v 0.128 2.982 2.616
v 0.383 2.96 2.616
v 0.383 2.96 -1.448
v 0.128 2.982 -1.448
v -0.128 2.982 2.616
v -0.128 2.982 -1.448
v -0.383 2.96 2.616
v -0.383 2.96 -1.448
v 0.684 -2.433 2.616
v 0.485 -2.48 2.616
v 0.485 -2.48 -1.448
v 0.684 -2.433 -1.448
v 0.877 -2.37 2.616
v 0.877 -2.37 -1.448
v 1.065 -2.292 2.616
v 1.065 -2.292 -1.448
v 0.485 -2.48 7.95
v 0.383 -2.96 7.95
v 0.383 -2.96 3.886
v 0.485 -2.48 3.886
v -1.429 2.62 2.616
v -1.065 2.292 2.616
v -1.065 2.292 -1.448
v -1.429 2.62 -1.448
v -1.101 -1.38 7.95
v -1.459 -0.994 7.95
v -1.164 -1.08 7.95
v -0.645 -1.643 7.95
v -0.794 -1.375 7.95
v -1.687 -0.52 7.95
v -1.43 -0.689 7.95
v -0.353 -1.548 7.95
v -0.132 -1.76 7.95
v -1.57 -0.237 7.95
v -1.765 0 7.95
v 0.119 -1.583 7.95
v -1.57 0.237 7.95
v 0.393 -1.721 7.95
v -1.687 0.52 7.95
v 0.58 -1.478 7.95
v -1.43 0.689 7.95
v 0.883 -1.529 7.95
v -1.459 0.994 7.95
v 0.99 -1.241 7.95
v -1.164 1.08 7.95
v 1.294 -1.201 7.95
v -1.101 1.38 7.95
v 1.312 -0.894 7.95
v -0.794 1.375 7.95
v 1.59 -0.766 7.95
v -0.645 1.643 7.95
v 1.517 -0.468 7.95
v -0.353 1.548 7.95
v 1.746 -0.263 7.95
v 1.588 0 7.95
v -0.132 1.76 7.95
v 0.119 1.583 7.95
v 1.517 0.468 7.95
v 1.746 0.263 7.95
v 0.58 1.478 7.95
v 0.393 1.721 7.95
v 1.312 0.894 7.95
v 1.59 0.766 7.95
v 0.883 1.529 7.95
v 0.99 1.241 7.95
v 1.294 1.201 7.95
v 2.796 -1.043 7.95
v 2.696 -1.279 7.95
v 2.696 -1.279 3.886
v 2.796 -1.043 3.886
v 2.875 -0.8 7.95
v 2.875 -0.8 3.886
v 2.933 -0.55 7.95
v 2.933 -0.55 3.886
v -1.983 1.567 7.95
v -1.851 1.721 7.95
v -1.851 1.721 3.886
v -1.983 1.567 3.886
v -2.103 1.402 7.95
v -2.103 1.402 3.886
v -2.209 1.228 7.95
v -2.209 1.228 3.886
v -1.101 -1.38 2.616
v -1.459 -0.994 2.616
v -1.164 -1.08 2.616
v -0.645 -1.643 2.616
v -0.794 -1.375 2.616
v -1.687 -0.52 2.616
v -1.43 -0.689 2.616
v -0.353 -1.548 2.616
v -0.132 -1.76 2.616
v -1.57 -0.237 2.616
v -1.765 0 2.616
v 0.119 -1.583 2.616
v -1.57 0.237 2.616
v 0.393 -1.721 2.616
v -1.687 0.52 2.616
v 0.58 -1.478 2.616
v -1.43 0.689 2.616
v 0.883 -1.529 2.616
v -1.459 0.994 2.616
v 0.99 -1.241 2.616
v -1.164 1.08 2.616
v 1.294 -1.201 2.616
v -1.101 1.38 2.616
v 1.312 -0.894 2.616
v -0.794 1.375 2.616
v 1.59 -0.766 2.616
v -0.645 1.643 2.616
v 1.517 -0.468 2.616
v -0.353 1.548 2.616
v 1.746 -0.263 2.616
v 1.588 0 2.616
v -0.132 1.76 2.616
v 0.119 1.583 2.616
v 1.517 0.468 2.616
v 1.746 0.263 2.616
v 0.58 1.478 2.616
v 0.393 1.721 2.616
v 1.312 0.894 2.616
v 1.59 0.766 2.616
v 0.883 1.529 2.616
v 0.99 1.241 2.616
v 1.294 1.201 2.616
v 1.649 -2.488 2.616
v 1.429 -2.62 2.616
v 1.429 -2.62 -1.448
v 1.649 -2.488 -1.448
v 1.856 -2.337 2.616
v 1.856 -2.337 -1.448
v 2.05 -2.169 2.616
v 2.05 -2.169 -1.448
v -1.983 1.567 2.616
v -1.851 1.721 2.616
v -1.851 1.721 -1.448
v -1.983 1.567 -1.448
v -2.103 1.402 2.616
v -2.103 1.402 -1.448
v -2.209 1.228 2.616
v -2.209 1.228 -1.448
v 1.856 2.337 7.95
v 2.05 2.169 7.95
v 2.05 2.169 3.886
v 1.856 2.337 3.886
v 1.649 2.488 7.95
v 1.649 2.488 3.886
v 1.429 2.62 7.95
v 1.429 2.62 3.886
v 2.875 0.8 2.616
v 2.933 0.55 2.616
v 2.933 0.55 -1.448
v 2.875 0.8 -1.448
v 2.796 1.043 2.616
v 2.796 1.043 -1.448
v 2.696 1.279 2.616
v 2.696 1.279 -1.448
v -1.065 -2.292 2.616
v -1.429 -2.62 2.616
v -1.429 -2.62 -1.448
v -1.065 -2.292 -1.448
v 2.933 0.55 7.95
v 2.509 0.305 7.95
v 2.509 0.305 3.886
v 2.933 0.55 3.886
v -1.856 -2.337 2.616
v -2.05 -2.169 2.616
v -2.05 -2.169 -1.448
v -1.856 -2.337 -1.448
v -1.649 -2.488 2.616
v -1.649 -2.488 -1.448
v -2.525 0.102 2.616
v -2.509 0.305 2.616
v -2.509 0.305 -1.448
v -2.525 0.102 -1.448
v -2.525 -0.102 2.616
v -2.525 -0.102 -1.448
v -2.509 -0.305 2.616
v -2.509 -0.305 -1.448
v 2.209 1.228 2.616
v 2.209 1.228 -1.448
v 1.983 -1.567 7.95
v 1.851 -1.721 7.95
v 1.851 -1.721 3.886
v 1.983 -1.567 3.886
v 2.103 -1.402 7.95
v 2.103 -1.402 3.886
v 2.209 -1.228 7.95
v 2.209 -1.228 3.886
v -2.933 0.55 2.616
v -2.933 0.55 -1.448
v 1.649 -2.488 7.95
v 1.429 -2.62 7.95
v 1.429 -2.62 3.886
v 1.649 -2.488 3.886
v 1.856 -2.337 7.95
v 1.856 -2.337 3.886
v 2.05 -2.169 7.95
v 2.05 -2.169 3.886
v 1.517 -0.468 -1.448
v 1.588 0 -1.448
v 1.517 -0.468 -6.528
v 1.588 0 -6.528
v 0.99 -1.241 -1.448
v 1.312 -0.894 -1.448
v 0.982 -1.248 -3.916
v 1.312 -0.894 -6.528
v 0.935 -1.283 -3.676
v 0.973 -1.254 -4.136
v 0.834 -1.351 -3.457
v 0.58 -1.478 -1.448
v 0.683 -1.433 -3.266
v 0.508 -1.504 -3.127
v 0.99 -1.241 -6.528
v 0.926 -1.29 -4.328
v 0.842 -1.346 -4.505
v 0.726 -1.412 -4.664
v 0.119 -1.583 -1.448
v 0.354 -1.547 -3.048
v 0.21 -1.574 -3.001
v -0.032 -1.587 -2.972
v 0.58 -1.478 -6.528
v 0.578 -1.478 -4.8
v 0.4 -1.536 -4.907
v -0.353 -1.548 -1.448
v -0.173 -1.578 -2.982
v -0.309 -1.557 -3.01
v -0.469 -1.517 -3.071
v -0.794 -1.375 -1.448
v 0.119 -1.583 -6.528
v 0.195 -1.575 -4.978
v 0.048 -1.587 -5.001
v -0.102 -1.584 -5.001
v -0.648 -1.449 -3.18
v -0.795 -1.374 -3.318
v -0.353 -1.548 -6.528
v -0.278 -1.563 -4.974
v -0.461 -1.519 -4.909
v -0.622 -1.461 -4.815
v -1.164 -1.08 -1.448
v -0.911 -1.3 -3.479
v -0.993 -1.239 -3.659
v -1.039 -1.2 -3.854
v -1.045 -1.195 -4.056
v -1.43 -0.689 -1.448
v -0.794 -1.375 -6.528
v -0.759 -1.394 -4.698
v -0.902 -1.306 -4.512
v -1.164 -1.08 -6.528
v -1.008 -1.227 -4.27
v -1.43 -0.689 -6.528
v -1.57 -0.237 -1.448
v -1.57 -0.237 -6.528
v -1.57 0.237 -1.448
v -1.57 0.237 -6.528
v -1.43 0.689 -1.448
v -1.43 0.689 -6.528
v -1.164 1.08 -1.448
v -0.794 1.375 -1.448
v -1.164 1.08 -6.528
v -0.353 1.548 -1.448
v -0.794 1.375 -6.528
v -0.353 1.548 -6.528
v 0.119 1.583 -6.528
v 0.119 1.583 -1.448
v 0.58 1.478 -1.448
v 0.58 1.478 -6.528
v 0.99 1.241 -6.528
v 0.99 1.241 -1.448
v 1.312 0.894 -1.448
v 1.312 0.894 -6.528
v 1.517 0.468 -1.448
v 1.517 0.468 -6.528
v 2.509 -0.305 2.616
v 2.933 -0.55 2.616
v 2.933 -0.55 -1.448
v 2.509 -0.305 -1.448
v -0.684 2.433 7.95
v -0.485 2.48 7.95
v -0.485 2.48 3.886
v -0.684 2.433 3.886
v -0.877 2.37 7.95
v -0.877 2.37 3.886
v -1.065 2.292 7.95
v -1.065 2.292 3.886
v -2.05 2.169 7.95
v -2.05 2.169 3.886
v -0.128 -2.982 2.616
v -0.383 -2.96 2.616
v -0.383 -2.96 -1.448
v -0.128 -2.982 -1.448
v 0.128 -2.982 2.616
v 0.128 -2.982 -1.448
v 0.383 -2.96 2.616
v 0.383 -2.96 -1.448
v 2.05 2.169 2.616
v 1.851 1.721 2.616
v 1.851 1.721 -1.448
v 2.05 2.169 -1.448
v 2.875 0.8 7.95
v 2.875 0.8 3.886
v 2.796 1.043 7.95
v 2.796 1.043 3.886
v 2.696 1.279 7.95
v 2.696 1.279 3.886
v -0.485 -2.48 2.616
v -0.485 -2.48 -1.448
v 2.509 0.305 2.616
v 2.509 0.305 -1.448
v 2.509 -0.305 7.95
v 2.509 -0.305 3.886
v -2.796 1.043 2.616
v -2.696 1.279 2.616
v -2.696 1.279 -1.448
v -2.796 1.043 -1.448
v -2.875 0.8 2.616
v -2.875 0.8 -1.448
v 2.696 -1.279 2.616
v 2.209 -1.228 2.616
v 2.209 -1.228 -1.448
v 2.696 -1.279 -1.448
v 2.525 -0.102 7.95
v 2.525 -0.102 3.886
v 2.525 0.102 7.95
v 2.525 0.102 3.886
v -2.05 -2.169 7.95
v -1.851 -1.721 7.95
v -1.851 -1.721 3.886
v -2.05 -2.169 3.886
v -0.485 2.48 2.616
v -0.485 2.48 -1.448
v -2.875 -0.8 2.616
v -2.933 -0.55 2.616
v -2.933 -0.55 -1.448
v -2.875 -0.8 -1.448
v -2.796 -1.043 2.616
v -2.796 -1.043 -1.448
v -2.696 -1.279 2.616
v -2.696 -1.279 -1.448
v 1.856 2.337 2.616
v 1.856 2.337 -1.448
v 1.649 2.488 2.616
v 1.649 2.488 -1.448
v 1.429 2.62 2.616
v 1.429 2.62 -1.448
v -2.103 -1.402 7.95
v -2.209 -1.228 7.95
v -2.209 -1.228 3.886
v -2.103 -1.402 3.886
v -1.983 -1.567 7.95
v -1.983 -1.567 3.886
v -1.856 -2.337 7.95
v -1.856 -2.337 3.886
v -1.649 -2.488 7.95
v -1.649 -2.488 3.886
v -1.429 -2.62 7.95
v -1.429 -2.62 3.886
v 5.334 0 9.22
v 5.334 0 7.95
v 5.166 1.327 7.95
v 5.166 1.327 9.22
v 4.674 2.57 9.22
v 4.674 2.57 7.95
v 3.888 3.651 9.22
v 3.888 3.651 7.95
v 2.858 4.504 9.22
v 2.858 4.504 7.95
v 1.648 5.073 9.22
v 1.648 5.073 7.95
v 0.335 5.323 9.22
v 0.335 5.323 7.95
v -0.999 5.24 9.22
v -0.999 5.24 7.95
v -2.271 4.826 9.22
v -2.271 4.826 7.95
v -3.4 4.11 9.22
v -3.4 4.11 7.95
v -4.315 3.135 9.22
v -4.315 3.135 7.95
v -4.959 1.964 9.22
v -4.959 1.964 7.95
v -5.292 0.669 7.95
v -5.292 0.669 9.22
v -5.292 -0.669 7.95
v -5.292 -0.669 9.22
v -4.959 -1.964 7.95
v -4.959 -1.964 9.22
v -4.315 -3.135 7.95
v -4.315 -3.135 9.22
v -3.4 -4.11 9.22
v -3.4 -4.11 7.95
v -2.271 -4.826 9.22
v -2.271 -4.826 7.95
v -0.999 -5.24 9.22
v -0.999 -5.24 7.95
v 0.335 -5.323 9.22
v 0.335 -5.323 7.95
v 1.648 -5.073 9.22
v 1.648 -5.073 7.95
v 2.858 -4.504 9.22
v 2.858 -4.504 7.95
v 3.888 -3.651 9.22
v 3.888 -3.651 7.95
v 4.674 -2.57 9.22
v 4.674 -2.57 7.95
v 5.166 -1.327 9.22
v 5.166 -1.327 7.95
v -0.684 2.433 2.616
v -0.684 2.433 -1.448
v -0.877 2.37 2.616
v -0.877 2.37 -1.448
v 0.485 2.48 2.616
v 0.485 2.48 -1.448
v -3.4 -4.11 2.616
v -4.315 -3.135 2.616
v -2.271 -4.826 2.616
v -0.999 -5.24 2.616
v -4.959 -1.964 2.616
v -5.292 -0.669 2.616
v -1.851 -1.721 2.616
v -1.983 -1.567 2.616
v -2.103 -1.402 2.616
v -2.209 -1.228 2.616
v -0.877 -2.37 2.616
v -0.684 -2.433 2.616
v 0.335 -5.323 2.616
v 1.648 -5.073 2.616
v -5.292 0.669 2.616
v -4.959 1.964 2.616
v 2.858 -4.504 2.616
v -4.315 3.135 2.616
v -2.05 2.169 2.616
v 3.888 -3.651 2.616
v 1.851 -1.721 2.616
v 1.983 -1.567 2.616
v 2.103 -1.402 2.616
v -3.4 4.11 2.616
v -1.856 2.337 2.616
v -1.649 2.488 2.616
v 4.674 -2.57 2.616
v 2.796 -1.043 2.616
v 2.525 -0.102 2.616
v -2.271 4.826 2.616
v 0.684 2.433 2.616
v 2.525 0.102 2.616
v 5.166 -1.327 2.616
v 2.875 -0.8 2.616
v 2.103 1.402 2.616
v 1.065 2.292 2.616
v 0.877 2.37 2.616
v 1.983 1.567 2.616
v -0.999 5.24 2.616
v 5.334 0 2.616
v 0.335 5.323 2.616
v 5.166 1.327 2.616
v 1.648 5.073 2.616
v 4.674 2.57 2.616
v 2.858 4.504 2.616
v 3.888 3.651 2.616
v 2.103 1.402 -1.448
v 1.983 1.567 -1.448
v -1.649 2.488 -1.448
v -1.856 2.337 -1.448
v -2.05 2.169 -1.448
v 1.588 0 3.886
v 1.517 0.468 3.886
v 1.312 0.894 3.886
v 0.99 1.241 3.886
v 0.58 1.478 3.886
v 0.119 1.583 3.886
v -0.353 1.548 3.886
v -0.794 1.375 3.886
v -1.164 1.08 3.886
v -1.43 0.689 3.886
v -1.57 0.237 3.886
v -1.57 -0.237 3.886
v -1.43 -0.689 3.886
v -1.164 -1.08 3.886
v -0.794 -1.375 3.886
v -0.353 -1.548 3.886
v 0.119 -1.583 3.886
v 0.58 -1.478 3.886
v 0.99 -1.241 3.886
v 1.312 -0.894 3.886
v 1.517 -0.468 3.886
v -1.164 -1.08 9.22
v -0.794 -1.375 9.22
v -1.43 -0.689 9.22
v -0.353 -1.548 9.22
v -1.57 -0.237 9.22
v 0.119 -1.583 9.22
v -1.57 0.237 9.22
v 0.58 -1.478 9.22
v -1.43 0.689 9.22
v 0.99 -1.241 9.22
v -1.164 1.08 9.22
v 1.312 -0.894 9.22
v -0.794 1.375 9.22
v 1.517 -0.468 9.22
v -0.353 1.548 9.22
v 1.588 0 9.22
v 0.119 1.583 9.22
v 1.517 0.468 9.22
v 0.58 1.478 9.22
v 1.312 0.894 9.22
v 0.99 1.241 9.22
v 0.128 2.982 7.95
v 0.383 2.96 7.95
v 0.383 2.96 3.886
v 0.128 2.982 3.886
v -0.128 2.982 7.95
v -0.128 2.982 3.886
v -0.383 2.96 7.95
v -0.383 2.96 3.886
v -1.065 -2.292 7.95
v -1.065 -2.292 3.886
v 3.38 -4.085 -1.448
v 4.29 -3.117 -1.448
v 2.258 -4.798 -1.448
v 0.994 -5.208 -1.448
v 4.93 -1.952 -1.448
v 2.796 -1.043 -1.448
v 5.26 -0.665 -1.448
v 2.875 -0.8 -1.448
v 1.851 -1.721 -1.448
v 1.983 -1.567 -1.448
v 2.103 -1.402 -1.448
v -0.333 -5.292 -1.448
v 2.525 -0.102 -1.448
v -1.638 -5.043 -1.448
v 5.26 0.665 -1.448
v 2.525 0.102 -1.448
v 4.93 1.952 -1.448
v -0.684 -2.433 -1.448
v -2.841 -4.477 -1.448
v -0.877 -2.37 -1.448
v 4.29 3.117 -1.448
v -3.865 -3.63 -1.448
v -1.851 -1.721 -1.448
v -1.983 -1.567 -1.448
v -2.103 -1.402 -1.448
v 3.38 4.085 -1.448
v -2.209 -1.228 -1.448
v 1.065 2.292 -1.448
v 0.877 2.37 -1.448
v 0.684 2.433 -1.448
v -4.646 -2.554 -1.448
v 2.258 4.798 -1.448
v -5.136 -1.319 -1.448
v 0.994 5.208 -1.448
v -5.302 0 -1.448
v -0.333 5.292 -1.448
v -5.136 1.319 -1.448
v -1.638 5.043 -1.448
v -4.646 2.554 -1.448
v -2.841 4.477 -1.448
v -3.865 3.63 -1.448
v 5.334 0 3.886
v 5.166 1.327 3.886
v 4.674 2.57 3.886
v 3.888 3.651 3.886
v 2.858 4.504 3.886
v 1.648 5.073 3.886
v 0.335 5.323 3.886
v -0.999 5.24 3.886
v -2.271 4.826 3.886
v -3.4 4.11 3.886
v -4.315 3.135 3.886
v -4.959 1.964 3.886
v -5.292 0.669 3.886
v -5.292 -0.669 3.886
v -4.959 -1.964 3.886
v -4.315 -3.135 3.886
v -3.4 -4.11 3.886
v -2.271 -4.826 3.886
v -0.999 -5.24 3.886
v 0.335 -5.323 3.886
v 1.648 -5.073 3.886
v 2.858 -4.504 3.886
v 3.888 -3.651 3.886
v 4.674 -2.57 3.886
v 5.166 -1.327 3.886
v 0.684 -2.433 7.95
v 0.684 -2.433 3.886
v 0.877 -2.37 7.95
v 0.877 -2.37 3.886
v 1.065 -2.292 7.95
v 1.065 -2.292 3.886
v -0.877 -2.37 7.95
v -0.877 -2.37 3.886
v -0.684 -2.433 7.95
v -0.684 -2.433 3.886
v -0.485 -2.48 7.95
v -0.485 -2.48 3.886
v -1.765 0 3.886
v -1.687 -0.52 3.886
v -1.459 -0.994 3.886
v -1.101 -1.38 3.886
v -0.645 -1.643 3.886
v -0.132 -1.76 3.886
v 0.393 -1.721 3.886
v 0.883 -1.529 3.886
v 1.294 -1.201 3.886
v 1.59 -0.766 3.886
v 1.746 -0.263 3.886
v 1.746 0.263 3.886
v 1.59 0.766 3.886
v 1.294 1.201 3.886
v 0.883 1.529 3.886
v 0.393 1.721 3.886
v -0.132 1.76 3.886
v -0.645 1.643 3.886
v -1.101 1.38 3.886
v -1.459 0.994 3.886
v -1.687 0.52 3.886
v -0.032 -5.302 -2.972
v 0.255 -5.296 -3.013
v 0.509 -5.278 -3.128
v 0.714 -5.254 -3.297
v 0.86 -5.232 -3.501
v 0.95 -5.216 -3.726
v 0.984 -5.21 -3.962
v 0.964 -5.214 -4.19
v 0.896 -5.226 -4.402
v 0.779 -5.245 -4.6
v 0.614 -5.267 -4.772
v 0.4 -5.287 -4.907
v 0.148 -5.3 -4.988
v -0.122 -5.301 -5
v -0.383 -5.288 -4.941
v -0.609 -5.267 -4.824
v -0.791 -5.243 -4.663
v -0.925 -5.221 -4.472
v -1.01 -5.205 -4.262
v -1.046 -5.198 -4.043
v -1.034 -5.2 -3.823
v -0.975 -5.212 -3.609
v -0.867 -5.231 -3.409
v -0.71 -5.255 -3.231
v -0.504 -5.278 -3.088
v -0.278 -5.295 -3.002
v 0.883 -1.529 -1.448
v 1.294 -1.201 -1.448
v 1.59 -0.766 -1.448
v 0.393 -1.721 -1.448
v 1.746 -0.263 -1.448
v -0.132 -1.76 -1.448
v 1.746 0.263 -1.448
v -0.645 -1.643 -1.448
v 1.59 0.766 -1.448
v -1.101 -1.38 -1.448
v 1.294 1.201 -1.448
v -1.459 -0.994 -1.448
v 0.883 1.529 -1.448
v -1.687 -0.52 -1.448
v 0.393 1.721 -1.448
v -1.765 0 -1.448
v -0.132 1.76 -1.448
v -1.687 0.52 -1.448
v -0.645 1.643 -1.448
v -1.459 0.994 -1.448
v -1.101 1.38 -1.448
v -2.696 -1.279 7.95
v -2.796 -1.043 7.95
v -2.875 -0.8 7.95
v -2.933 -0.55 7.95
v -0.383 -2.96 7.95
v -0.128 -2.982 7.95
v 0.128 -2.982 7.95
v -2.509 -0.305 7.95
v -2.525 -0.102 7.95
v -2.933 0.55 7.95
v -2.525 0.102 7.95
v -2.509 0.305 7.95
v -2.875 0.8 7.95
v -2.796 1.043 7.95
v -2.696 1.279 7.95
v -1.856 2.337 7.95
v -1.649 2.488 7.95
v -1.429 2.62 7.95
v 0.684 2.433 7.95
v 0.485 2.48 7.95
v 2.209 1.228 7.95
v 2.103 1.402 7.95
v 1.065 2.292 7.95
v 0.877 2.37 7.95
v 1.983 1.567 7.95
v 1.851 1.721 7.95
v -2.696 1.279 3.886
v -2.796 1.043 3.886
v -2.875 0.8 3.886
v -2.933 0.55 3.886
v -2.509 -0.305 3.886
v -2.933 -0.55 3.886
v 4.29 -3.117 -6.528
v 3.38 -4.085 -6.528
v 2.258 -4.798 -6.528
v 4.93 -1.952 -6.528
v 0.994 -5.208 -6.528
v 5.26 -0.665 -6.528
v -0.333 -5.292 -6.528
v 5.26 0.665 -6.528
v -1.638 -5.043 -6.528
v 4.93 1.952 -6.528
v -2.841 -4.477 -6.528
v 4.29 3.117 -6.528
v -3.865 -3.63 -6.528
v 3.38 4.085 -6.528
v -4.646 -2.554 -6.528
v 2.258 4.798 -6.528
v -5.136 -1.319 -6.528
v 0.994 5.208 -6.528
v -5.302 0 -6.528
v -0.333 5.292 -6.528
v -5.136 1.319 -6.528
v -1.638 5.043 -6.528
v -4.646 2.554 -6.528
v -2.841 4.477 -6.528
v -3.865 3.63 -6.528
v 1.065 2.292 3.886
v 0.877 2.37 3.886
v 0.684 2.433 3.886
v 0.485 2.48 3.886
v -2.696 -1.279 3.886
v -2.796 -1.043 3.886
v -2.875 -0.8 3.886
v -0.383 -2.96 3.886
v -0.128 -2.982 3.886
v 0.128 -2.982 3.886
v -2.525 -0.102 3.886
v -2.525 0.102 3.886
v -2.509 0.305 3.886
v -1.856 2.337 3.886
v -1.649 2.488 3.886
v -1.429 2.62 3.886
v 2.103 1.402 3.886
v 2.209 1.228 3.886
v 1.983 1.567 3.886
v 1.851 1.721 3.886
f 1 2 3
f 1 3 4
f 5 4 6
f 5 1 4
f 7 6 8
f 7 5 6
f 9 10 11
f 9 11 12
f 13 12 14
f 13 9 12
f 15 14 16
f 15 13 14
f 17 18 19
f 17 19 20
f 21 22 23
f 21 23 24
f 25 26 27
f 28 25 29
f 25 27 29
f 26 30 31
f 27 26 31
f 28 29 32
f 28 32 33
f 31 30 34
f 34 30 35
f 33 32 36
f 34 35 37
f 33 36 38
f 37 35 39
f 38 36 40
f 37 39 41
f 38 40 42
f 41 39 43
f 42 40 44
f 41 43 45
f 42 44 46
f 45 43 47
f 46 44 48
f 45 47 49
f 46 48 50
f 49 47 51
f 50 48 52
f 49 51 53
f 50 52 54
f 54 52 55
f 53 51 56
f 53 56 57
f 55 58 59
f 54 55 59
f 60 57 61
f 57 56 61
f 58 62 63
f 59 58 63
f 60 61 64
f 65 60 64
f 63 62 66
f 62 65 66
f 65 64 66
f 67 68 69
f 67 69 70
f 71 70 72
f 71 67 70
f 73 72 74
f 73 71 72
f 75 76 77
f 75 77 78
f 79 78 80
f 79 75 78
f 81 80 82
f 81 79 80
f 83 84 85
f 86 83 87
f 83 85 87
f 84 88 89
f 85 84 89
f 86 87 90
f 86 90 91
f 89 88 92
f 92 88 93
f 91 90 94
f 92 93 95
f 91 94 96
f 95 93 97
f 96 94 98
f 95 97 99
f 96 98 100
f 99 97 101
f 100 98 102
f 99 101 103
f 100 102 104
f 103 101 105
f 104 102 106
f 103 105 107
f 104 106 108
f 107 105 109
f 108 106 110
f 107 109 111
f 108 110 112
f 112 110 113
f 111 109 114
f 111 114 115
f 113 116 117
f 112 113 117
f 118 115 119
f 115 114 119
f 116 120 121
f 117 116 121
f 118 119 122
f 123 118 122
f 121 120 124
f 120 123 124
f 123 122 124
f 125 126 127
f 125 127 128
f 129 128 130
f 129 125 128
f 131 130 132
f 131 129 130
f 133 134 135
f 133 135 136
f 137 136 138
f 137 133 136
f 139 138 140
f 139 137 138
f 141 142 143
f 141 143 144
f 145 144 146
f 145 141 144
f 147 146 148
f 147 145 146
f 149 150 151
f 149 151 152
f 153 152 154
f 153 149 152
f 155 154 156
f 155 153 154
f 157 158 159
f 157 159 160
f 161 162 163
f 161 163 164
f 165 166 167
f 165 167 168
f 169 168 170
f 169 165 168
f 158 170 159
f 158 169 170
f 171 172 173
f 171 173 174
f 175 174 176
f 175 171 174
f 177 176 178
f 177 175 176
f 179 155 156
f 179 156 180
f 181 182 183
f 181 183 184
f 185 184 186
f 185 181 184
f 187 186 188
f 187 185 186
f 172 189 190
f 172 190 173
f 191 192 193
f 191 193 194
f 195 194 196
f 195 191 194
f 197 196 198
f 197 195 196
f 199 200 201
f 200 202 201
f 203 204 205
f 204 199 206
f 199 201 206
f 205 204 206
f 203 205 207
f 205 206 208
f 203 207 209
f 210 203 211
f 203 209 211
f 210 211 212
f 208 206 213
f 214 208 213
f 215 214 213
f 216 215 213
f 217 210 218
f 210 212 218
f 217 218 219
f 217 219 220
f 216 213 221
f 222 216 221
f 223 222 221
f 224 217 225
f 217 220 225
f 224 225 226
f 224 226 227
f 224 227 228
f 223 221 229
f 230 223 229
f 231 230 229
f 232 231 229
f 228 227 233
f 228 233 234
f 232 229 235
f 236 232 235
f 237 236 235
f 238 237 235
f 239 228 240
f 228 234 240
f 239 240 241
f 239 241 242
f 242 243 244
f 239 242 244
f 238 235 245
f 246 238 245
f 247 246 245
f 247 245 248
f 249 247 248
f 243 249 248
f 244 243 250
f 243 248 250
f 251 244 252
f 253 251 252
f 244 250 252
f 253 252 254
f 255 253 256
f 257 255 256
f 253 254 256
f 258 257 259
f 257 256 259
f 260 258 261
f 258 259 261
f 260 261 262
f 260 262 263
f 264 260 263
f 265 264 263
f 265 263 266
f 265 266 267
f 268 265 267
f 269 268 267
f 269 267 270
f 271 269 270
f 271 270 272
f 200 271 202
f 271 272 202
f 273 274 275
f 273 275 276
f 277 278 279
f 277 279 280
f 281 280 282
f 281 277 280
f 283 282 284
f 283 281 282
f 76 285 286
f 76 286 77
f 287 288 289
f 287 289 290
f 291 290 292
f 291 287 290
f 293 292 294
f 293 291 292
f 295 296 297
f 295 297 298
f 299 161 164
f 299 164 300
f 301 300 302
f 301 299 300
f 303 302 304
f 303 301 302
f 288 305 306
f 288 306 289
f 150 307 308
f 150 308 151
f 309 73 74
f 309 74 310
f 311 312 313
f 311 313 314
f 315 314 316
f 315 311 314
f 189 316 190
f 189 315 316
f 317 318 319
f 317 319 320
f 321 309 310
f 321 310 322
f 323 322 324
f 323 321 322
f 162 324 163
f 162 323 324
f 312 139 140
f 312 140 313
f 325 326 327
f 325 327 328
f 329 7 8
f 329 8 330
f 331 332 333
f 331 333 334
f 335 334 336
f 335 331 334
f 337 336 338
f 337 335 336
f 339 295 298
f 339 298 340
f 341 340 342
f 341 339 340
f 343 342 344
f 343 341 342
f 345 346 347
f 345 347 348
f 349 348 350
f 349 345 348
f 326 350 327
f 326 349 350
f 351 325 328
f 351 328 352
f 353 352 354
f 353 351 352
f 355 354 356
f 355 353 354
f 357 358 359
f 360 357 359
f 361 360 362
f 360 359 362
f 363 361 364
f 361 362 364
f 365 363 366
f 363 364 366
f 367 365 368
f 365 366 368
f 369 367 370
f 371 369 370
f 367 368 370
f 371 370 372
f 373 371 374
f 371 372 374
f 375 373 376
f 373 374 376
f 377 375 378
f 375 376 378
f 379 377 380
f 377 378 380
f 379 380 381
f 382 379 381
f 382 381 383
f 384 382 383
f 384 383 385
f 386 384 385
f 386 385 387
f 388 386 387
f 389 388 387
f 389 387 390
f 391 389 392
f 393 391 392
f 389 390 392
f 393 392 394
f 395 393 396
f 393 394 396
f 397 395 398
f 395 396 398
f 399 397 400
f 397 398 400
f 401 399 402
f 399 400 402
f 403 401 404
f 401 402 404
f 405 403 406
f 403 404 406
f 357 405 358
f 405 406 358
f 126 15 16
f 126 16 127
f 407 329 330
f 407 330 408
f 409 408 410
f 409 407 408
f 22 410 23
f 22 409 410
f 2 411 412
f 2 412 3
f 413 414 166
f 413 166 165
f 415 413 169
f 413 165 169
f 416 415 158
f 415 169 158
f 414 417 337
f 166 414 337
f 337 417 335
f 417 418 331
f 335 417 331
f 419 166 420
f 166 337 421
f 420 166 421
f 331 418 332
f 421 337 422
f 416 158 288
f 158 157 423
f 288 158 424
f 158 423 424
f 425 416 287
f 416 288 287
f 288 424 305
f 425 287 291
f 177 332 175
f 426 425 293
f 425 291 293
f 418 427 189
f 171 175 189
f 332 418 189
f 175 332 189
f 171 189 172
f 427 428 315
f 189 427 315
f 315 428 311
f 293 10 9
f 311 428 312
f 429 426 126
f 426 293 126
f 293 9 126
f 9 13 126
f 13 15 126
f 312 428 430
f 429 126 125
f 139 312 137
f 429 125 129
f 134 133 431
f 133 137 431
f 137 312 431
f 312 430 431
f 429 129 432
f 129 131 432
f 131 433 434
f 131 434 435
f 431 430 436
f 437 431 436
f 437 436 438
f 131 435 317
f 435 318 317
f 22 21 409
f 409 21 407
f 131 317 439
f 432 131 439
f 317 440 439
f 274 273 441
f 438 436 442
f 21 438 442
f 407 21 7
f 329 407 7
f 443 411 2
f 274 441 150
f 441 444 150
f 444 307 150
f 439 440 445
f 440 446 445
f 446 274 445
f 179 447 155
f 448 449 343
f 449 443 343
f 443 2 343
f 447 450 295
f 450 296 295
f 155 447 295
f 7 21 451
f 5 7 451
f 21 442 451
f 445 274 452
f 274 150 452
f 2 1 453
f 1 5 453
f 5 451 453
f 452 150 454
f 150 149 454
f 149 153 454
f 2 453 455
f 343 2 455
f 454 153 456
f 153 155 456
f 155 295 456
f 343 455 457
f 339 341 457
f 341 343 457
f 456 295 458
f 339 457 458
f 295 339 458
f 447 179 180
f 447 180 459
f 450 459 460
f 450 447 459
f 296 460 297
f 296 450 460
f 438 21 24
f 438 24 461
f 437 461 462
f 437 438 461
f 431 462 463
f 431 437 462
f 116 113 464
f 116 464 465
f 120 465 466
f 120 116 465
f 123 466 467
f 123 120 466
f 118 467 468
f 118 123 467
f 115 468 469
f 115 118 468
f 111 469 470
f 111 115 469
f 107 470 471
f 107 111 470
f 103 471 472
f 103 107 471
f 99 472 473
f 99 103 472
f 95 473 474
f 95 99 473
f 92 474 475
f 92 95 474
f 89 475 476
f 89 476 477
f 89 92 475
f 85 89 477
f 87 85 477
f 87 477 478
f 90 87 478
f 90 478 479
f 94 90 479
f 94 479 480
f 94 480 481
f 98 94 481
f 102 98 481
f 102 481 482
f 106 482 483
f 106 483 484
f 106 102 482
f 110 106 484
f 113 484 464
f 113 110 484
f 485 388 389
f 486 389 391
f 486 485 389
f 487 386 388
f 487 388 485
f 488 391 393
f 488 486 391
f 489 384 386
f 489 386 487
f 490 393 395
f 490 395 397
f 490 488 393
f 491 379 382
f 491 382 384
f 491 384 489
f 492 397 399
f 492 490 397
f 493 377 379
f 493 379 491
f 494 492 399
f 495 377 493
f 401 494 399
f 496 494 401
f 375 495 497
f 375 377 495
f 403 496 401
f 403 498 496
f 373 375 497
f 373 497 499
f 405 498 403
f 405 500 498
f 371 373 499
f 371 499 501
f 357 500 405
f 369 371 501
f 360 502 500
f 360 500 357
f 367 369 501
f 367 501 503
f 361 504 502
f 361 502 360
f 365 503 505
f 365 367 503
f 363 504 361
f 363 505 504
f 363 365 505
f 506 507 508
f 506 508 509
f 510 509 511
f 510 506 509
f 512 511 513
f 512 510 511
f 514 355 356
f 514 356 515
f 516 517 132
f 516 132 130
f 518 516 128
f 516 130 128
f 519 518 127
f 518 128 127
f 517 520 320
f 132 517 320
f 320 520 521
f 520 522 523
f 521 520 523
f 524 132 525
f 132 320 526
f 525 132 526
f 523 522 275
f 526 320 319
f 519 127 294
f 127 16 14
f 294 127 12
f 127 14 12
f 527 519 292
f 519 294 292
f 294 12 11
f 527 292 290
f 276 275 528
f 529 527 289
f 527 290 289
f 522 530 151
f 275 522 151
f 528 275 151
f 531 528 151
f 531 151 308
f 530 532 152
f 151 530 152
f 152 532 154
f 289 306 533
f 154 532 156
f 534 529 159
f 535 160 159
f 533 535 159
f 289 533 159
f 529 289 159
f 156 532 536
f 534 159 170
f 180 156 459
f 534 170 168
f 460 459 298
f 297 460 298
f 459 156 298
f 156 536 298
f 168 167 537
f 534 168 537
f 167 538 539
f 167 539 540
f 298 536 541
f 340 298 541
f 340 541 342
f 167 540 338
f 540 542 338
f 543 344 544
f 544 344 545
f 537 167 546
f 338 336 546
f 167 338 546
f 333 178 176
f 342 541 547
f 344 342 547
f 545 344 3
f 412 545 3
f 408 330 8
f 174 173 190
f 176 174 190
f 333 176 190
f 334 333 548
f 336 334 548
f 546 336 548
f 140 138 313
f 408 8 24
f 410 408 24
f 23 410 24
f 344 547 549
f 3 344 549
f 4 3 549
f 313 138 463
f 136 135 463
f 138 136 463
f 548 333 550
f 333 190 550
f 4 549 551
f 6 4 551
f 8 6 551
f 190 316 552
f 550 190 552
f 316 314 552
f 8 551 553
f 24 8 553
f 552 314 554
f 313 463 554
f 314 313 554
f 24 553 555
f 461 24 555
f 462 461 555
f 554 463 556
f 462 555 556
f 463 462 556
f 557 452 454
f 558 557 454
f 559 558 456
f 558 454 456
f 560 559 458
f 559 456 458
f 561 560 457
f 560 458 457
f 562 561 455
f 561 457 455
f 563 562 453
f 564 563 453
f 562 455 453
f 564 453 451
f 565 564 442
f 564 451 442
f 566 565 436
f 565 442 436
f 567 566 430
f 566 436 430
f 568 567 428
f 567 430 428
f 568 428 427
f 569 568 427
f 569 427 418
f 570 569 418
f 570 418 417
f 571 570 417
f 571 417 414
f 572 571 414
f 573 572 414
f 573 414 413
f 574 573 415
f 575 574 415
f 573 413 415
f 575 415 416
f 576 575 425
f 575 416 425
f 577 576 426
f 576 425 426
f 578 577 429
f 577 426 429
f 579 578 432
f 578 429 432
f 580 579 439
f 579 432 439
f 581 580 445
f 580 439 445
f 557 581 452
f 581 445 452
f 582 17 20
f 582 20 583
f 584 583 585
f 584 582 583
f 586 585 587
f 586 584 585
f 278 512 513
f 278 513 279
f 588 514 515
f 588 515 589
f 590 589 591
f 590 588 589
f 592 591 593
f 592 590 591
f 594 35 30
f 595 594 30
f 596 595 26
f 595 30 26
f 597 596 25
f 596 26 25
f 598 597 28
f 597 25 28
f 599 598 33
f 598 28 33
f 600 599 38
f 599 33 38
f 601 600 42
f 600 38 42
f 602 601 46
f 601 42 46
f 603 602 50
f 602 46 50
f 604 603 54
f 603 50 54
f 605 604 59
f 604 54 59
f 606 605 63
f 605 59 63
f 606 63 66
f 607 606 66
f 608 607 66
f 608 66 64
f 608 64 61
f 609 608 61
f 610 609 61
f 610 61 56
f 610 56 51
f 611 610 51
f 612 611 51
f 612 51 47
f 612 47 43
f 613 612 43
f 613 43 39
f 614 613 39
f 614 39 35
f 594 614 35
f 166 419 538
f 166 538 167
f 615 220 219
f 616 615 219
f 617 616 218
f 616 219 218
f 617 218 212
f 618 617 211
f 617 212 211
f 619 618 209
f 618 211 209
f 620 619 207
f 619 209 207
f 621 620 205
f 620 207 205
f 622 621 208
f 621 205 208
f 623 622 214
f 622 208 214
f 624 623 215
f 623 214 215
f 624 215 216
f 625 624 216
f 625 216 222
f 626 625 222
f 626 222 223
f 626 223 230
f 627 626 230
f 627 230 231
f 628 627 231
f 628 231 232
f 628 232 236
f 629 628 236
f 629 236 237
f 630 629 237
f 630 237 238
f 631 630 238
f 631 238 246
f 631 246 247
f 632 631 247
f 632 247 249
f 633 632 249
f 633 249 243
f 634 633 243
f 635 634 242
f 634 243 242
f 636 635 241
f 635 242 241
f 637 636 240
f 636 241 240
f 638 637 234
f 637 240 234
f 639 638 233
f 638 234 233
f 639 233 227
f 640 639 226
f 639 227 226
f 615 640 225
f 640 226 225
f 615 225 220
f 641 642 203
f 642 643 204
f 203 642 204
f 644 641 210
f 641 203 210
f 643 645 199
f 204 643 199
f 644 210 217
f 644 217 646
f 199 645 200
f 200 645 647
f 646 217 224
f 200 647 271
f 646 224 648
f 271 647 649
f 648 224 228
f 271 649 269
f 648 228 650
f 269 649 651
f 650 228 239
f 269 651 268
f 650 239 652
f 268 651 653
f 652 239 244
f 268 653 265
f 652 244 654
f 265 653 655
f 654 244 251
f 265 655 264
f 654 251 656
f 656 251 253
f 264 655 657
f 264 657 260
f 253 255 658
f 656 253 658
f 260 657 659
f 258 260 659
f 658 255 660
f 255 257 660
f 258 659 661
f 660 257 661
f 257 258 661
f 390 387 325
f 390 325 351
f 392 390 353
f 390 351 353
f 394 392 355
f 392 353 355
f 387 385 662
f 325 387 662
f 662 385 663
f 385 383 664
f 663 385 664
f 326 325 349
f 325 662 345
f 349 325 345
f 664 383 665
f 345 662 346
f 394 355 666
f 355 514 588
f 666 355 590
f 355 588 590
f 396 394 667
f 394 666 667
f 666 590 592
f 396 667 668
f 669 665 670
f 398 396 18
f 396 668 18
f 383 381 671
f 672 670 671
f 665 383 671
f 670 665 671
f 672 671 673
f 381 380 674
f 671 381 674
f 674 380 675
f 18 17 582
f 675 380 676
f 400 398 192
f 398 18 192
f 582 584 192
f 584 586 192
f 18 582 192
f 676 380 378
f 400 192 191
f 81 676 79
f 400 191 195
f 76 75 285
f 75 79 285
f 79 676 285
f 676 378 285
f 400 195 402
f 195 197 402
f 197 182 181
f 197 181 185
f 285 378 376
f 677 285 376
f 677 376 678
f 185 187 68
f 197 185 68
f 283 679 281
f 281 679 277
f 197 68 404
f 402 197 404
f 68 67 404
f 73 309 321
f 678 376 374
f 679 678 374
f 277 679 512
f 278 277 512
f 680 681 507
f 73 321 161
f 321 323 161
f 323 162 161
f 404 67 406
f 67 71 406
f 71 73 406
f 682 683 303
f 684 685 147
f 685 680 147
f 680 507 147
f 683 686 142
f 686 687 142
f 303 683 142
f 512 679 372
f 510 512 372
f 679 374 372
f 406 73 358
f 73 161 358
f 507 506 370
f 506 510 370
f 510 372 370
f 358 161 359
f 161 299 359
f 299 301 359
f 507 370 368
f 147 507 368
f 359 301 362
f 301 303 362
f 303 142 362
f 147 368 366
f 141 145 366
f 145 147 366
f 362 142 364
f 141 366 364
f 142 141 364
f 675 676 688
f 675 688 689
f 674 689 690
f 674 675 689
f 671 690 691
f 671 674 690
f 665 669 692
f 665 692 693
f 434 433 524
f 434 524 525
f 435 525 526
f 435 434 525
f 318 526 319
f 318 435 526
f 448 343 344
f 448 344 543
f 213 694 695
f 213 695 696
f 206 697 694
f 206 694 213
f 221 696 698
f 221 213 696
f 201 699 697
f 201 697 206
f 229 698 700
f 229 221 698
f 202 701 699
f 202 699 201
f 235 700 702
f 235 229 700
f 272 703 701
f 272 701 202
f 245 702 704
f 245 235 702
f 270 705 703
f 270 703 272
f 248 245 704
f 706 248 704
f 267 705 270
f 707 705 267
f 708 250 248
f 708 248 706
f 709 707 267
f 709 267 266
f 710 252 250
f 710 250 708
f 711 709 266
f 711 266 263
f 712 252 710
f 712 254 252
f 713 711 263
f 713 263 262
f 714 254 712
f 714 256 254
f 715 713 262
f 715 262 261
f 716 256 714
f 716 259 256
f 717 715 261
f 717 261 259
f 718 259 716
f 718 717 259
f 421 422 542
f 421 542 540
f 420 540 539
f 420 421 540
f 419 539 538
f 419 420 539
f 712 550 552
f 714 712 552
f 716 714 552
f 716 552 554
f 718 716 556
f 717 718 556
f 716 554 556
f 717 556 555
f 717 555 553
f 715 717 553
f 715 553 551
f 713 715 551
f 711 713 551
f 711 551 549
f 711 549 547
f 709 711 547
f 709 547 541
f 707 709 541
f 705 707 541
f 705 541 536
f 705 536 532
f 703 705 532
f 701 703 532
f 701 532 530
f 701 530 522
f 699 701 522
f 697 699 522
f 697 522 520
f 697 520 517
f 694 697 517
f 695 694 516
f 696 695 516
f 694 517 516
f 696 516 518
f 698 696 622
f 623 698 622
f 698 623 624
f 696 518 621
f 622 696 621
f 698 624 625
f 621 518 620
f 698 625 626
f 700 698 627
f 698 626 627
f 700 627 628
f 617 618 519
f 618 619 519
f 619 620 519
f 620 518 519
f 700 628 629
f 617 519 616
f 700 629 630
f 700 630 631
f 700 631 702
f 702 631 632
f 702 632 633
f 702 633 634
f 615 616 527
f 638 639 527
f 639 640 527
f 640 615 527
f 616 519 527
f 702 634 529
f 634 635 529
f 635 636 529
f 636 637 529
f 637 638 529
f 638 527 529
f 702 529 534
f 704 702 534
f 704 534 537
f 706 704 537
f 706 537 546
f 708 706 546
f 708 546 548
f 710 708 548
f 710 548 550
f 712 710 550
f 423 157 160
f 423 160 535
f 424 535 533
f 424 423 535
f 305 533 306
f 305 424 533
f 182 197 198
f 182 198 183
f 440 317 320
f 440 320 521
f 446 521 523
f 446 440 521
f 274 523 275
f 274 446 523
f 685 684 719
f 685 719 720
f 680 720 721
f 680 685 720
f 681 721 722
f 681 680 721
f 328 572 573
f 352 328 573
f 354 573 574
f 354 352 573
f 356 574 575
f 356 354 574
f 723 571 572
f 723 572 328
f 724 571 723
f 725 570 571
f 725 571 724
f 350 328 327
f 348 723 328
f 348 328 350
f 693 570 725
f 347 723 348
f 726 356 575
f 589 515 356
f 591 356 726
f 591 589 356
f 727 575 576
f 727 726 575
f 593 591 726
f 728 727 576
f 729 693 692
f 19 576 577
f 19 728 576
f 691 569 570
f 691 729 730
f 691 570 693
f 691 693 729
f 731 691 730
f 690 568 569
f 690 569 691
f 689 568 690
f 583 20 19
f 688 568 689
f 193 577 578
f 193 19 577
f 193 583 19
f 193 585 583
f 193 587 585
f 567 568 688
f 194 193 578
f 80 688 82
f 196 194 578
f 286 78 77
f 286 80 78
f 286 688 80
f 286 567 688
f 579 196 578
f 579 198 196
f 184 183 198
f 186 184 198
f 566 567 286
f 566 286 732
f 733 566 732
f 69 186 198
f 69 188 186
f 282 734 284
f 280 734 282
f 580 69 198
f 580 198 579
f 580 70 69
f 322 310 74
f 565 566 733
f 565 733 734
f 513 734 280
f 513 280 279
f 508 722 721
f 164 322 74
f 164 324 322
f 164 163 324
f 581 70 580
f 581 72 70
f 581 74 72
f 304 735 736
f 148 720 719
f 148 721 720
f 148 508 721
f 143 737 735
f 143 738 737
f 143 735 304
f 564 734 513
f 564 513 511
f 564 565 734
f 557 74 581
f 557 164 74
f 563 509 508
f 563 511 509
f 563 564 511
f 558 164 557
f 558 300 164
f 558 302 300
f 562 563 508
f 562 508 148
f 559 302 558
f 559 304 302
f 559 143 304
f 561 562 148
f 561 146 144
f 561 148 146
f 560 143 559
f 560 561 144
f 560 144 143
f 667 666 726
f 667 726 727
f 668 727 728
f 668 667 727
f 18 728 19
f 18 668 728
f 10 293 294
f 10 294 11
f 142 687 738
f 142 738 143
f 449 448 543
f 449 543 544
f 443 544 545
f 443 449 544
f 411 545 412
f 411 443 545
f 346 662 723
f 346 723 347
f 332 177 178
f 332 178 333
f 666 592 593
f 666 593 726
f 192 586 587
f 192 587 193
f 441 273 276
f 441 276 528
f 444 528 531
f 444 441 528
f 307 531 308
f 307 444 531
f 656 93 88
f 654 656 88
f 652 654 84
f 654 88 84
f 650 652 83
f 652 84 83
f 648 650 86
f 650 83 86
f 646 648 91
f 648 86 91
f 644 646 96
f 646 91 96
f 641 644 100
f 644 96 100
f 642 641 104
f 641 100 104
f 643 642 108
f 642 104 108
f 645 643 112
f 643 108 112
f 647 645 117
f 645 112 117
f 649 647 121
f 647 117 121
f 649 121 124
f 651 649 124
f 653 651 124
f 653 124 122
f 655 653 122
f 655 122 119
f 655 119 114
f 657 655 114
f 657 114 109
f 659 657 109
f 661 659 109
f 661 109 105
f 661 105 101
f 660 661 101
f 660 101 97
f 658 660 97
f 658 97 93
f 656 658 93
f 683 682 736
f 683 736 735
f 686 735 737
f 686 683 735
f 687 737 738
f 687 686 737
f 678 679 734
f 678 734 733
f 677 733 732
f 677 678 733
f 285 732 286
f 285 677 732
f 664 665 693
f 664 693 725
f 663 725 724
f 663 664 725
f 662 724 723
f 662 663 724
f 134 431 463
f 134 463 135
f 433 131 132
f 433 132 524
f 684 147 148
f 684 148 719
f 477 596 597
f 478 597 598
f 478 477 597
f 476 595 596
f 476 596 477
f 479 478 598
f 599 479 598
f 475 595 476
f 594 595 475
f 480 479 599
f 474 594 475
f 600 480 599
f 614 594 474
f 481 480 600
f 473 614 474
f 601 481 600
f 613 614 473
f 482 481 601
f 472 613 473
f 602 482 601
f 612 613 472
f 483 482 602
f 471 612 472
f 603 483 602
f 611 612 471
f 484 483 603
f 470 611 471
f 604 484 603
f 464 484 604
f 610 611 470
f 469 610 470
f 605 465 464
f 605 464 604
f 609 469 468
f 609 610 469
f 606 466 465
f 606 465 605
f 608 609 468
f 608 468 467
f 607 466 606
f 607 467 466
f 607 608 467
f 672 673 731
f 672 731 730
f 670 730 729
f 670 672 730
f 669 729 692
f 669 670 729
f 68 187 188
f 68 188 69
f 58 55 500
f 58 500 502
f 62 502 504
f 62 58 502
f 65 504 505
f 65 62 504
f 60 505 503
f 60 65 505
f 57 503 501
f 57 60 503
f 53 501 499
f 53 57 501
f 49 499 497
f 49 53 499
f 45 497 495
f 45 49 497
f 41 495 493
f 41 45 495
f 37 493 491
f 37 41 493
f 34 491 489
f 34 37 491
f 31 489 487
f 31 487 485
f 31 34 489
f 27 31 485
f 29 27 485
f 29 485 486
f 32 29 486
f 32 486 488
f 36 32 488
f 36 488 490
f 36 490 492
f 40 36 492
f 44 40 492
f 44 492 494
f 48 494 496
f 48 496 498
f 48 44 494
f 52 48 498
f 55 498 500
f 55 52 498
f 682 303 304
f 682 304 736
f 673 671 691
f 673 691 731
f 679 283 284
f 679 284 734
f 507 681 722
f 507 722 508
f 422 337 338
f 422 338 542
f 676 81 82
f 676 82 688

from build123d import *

# Parameters (mm, degrees)
SKETCH1_R           = 1.7653
BOSS_EXTRUDE1_DEPTH = 9.398
SKETCH2_R           = 5.334
SKETCH2_R_2         = 1.5875
BOSS_EXTRUDE2_DEPTH = 1.27
BOSS_EXTRUDE3_START = -1.27
SKETCH3_R           = 5.334
SKETCH3_R_2         = 1.5875
BOSS_EXTRUDE3_DEPTH = 1.27
SKETCH4_R           = 5.302265601
BOSS_EXTRUDE4_DEPTH = 5.08
SKETCH5_R           = 1.016
CUT_EXTRUDE1_DEPTH  = 7.62
SKETCH7_R           = 1.5875
CUT_EXTRUDE3_DEPTH  = 18.461460878


with BuildPart() as part:
    # Sketch1 → Boss-Extrude1 (new body)
    with BuildSketch(Plane.XY.offset(7.9502)):
        with BuildLine():
            Line((-2.508852776, -0.3048), (-2.933400151, -0.549912542))
            ThreePointArc((-2.933400151, -0.549912542), (-2.838428173, -0.92226122), (-2.696401056, -1.279320756))
            Line((-2.696401056, -1.279320756), (-2.208861477, -1.228078282))
            ThreePointArc((-2.208861477, -1.228078282), (-2.04462865, -1.485509668), (-1.850547587, -1.721255042))
            Line((-1.850547587, -1.721255042), (-2.049940092, -2.169097939))
            ThreePointArc((-2.049940092, -2.169097939), (-1.754245085, -2.41451122), (-1.429468404, -2.619897008))
            Line((-1.429468404, -2.619897008), (-1.06516017, -2.291872401))
            ThreePointArc((-1.06516017, -2.291872401), (-0.78097865, -2.403605134), (-0.485396118, -2.480249161))
            Line((-0.485396118, -2.480249161), (-0.383472592, -2.959761649))
            ThreePointArc((-0.383472592, -2.959761649), (0, -2.9845), (0.383472592, -2.959761649))
            Line((0.383472592, -2.959761649), (0.485396118, -2.480249161))
            ThreePointArc((0.485396118, -2.480249161), (0.78097865, -2.403605134), (1.06516017, -2.291872401))
            Line((1.06516017, -2.291872401), (1.429468404, -2.619897008))
            ThreePointArc((1.429468404, -2.619897008), (1.754245085, -2.41451122), (2.049940092, -2.169097939))
            Line((2.049940092, -2.169097939), (1.850547587, -1.721255042))
            ThreePointArc((1.850547587, -1.721255042), (2.04462865, -1.485509668), (2.208861477, -1.228078282))
            Line((2.208861477, -1.228078282), (2.696401056, -1.279320756))
            ThreePointArc((2.696401056, -1.279320756), (2.838428173, -0.92226122), (2.933400151, -0.549912542))
            Line((2.933400151, -0.549912542), (2.508852776, -0.3048))
            ThreePointArc((2.508852776, -0.3048), (2.5273, 0), (2.508852776, 0.3048))
            Line((2.508852776, 0.3048), (2.933400151, 0.549912542))
            ThreePointArc((2.933400151, 0.549912542), (2.838428173, 0.92226122), (2.696401056, 1.279320756))
            Line((2.696401056, 1.279320756), (2.208861477, 1.228078282))
            ThreePointArc((2.208861477, 1.228078282), (2.04462865, 1.485509668), (1.850547587, 1.721255042))
            Line((1.850547587, 1.721255042), (2.049940092, 2.169097939))
            ThreePointArc((2.049940092, 2.169097939), (1.754245085, 2.41451122), (1.429468404, 2.619897008))
            Line((1.429468404, 2.619897008), (1.06516017, 2.291872401))
            ThreePointArc((1.06516017, 2.291872401), (0.78097865, 2.403605134), (0.485396118, 2.480249161))
            Line((0.485396118, 2.480249161), (0.383472592, 2.959761649))
            ThreePointArc((0.383472592, 2.959761649), (0, 2.9845), (-0.383472592, 2.959761649))
            Line((-0.383472592, 2.959761649), (-0.485396118, 2.480249161))
            ThreePointArc((-0.485396118, 2.480249161), (-0.78097865, 2.403605134), (-1.06516017, 2.291872401))
            Line((-1.06516017, 2.291872401), (-1.429468404, 2.619897008))
            ThreePointArc((-1.429468404, 2.619897008), (-1.754245085, 2.41451122), (-2.049940092, 2.169097939))
            Line((-2.049940092, 2.169097939), (-1.850547587, 1.721255042))
            ThreePointArc((-1.850547587, 1.721255042), (-2.04462865, 1.485509668), (-2.208861477, 1.228078282))
            Line((-2.208861477, 1.228078282), (-2.696401056, 1.279320756))
            ThreePointArc((-2.696401056, 1.279320756), (-2.838428173, 0.92226122), (-2.933400151, 0.549912542))
            Line((-2.933400151, 0.549912542), (-2.508852776, 0.3048))
            ThreePointArc((-2.508852776, 0.3048), (-2.5273, 0), (-2.508852776, -0.3048))
        make_face()
        with Locations(Location((0, 0, 0), (0, 0, 180))):
            Circle(SKETCH1_R, mode=Mode.SUBTRACT)
    extrude(amount=-BOSS_EXTRUDE1_DEPTH)

    # Sketch2 → Boss-Extrude2 (add)
    with BuildSketch(Plane.XY.offset(7.9502)):
        Circle(SKETCH2_R)
        Circle(SKETCH2_R_2, mode=Mode.SUBTRACT)
    extrude(amount=BOSS_EXTRUDE2_DEPTH)

    # Sketch3 → Boss-Extrude3 (add)
    with BuildSketch(Plane.XY.offset(3.8862).offset(BOSS_EXTRUDE3_START)):
        Circle(SKETCH3_R)
        Circle(SKETCH3_R_2, mode=Mode.SUBTRACT)
    extrude(amount=BOSS_EXTRUDE3_DEPTH)

    # Sketch4 → Boss-Extrude4 (add)
    with BuildSketch(Plane(origin=(0, 0, -1.4478), x_dir=(-1, 0, 0), z_dir=(0, 0, -1))):
        Circle(SKETCH4_R)
    extrude(amount=BOSS_EXTRUDE4_DEPTH)

    # Sketch5 → Cut-Extrude1 (cut)
    with BuildSketch(Plane(origin=(0, 0, 0), x_dir=(1, 0, 0), z_dir=(0, 1, 0))):
        with Locations(Location((-0.031734399, 3.9878, 0), (0, 0, 270))):
            Circle(SKETCH5_R)
    extrude(amount=-CUT_EXTRUDE1_DEPTH, mode=Mode.SUBTRACT)

    # Sketch7 → Cut-Extrude3 (cut, through all)
    with BuildSketch(Plane(origin=(0, 0, -6.5278), x_dir=(-1, 0, 0), z_dir=(0, 0, -1))):
        with Locations(Location((0, 0, 0), (0, 0, 180))):
            Circle(SKETCH7_R)
    extrude(amount=-CUT_EXTRUDE3_DEPTH, mode=Mode.SUBTRACT)


solid = part.part
